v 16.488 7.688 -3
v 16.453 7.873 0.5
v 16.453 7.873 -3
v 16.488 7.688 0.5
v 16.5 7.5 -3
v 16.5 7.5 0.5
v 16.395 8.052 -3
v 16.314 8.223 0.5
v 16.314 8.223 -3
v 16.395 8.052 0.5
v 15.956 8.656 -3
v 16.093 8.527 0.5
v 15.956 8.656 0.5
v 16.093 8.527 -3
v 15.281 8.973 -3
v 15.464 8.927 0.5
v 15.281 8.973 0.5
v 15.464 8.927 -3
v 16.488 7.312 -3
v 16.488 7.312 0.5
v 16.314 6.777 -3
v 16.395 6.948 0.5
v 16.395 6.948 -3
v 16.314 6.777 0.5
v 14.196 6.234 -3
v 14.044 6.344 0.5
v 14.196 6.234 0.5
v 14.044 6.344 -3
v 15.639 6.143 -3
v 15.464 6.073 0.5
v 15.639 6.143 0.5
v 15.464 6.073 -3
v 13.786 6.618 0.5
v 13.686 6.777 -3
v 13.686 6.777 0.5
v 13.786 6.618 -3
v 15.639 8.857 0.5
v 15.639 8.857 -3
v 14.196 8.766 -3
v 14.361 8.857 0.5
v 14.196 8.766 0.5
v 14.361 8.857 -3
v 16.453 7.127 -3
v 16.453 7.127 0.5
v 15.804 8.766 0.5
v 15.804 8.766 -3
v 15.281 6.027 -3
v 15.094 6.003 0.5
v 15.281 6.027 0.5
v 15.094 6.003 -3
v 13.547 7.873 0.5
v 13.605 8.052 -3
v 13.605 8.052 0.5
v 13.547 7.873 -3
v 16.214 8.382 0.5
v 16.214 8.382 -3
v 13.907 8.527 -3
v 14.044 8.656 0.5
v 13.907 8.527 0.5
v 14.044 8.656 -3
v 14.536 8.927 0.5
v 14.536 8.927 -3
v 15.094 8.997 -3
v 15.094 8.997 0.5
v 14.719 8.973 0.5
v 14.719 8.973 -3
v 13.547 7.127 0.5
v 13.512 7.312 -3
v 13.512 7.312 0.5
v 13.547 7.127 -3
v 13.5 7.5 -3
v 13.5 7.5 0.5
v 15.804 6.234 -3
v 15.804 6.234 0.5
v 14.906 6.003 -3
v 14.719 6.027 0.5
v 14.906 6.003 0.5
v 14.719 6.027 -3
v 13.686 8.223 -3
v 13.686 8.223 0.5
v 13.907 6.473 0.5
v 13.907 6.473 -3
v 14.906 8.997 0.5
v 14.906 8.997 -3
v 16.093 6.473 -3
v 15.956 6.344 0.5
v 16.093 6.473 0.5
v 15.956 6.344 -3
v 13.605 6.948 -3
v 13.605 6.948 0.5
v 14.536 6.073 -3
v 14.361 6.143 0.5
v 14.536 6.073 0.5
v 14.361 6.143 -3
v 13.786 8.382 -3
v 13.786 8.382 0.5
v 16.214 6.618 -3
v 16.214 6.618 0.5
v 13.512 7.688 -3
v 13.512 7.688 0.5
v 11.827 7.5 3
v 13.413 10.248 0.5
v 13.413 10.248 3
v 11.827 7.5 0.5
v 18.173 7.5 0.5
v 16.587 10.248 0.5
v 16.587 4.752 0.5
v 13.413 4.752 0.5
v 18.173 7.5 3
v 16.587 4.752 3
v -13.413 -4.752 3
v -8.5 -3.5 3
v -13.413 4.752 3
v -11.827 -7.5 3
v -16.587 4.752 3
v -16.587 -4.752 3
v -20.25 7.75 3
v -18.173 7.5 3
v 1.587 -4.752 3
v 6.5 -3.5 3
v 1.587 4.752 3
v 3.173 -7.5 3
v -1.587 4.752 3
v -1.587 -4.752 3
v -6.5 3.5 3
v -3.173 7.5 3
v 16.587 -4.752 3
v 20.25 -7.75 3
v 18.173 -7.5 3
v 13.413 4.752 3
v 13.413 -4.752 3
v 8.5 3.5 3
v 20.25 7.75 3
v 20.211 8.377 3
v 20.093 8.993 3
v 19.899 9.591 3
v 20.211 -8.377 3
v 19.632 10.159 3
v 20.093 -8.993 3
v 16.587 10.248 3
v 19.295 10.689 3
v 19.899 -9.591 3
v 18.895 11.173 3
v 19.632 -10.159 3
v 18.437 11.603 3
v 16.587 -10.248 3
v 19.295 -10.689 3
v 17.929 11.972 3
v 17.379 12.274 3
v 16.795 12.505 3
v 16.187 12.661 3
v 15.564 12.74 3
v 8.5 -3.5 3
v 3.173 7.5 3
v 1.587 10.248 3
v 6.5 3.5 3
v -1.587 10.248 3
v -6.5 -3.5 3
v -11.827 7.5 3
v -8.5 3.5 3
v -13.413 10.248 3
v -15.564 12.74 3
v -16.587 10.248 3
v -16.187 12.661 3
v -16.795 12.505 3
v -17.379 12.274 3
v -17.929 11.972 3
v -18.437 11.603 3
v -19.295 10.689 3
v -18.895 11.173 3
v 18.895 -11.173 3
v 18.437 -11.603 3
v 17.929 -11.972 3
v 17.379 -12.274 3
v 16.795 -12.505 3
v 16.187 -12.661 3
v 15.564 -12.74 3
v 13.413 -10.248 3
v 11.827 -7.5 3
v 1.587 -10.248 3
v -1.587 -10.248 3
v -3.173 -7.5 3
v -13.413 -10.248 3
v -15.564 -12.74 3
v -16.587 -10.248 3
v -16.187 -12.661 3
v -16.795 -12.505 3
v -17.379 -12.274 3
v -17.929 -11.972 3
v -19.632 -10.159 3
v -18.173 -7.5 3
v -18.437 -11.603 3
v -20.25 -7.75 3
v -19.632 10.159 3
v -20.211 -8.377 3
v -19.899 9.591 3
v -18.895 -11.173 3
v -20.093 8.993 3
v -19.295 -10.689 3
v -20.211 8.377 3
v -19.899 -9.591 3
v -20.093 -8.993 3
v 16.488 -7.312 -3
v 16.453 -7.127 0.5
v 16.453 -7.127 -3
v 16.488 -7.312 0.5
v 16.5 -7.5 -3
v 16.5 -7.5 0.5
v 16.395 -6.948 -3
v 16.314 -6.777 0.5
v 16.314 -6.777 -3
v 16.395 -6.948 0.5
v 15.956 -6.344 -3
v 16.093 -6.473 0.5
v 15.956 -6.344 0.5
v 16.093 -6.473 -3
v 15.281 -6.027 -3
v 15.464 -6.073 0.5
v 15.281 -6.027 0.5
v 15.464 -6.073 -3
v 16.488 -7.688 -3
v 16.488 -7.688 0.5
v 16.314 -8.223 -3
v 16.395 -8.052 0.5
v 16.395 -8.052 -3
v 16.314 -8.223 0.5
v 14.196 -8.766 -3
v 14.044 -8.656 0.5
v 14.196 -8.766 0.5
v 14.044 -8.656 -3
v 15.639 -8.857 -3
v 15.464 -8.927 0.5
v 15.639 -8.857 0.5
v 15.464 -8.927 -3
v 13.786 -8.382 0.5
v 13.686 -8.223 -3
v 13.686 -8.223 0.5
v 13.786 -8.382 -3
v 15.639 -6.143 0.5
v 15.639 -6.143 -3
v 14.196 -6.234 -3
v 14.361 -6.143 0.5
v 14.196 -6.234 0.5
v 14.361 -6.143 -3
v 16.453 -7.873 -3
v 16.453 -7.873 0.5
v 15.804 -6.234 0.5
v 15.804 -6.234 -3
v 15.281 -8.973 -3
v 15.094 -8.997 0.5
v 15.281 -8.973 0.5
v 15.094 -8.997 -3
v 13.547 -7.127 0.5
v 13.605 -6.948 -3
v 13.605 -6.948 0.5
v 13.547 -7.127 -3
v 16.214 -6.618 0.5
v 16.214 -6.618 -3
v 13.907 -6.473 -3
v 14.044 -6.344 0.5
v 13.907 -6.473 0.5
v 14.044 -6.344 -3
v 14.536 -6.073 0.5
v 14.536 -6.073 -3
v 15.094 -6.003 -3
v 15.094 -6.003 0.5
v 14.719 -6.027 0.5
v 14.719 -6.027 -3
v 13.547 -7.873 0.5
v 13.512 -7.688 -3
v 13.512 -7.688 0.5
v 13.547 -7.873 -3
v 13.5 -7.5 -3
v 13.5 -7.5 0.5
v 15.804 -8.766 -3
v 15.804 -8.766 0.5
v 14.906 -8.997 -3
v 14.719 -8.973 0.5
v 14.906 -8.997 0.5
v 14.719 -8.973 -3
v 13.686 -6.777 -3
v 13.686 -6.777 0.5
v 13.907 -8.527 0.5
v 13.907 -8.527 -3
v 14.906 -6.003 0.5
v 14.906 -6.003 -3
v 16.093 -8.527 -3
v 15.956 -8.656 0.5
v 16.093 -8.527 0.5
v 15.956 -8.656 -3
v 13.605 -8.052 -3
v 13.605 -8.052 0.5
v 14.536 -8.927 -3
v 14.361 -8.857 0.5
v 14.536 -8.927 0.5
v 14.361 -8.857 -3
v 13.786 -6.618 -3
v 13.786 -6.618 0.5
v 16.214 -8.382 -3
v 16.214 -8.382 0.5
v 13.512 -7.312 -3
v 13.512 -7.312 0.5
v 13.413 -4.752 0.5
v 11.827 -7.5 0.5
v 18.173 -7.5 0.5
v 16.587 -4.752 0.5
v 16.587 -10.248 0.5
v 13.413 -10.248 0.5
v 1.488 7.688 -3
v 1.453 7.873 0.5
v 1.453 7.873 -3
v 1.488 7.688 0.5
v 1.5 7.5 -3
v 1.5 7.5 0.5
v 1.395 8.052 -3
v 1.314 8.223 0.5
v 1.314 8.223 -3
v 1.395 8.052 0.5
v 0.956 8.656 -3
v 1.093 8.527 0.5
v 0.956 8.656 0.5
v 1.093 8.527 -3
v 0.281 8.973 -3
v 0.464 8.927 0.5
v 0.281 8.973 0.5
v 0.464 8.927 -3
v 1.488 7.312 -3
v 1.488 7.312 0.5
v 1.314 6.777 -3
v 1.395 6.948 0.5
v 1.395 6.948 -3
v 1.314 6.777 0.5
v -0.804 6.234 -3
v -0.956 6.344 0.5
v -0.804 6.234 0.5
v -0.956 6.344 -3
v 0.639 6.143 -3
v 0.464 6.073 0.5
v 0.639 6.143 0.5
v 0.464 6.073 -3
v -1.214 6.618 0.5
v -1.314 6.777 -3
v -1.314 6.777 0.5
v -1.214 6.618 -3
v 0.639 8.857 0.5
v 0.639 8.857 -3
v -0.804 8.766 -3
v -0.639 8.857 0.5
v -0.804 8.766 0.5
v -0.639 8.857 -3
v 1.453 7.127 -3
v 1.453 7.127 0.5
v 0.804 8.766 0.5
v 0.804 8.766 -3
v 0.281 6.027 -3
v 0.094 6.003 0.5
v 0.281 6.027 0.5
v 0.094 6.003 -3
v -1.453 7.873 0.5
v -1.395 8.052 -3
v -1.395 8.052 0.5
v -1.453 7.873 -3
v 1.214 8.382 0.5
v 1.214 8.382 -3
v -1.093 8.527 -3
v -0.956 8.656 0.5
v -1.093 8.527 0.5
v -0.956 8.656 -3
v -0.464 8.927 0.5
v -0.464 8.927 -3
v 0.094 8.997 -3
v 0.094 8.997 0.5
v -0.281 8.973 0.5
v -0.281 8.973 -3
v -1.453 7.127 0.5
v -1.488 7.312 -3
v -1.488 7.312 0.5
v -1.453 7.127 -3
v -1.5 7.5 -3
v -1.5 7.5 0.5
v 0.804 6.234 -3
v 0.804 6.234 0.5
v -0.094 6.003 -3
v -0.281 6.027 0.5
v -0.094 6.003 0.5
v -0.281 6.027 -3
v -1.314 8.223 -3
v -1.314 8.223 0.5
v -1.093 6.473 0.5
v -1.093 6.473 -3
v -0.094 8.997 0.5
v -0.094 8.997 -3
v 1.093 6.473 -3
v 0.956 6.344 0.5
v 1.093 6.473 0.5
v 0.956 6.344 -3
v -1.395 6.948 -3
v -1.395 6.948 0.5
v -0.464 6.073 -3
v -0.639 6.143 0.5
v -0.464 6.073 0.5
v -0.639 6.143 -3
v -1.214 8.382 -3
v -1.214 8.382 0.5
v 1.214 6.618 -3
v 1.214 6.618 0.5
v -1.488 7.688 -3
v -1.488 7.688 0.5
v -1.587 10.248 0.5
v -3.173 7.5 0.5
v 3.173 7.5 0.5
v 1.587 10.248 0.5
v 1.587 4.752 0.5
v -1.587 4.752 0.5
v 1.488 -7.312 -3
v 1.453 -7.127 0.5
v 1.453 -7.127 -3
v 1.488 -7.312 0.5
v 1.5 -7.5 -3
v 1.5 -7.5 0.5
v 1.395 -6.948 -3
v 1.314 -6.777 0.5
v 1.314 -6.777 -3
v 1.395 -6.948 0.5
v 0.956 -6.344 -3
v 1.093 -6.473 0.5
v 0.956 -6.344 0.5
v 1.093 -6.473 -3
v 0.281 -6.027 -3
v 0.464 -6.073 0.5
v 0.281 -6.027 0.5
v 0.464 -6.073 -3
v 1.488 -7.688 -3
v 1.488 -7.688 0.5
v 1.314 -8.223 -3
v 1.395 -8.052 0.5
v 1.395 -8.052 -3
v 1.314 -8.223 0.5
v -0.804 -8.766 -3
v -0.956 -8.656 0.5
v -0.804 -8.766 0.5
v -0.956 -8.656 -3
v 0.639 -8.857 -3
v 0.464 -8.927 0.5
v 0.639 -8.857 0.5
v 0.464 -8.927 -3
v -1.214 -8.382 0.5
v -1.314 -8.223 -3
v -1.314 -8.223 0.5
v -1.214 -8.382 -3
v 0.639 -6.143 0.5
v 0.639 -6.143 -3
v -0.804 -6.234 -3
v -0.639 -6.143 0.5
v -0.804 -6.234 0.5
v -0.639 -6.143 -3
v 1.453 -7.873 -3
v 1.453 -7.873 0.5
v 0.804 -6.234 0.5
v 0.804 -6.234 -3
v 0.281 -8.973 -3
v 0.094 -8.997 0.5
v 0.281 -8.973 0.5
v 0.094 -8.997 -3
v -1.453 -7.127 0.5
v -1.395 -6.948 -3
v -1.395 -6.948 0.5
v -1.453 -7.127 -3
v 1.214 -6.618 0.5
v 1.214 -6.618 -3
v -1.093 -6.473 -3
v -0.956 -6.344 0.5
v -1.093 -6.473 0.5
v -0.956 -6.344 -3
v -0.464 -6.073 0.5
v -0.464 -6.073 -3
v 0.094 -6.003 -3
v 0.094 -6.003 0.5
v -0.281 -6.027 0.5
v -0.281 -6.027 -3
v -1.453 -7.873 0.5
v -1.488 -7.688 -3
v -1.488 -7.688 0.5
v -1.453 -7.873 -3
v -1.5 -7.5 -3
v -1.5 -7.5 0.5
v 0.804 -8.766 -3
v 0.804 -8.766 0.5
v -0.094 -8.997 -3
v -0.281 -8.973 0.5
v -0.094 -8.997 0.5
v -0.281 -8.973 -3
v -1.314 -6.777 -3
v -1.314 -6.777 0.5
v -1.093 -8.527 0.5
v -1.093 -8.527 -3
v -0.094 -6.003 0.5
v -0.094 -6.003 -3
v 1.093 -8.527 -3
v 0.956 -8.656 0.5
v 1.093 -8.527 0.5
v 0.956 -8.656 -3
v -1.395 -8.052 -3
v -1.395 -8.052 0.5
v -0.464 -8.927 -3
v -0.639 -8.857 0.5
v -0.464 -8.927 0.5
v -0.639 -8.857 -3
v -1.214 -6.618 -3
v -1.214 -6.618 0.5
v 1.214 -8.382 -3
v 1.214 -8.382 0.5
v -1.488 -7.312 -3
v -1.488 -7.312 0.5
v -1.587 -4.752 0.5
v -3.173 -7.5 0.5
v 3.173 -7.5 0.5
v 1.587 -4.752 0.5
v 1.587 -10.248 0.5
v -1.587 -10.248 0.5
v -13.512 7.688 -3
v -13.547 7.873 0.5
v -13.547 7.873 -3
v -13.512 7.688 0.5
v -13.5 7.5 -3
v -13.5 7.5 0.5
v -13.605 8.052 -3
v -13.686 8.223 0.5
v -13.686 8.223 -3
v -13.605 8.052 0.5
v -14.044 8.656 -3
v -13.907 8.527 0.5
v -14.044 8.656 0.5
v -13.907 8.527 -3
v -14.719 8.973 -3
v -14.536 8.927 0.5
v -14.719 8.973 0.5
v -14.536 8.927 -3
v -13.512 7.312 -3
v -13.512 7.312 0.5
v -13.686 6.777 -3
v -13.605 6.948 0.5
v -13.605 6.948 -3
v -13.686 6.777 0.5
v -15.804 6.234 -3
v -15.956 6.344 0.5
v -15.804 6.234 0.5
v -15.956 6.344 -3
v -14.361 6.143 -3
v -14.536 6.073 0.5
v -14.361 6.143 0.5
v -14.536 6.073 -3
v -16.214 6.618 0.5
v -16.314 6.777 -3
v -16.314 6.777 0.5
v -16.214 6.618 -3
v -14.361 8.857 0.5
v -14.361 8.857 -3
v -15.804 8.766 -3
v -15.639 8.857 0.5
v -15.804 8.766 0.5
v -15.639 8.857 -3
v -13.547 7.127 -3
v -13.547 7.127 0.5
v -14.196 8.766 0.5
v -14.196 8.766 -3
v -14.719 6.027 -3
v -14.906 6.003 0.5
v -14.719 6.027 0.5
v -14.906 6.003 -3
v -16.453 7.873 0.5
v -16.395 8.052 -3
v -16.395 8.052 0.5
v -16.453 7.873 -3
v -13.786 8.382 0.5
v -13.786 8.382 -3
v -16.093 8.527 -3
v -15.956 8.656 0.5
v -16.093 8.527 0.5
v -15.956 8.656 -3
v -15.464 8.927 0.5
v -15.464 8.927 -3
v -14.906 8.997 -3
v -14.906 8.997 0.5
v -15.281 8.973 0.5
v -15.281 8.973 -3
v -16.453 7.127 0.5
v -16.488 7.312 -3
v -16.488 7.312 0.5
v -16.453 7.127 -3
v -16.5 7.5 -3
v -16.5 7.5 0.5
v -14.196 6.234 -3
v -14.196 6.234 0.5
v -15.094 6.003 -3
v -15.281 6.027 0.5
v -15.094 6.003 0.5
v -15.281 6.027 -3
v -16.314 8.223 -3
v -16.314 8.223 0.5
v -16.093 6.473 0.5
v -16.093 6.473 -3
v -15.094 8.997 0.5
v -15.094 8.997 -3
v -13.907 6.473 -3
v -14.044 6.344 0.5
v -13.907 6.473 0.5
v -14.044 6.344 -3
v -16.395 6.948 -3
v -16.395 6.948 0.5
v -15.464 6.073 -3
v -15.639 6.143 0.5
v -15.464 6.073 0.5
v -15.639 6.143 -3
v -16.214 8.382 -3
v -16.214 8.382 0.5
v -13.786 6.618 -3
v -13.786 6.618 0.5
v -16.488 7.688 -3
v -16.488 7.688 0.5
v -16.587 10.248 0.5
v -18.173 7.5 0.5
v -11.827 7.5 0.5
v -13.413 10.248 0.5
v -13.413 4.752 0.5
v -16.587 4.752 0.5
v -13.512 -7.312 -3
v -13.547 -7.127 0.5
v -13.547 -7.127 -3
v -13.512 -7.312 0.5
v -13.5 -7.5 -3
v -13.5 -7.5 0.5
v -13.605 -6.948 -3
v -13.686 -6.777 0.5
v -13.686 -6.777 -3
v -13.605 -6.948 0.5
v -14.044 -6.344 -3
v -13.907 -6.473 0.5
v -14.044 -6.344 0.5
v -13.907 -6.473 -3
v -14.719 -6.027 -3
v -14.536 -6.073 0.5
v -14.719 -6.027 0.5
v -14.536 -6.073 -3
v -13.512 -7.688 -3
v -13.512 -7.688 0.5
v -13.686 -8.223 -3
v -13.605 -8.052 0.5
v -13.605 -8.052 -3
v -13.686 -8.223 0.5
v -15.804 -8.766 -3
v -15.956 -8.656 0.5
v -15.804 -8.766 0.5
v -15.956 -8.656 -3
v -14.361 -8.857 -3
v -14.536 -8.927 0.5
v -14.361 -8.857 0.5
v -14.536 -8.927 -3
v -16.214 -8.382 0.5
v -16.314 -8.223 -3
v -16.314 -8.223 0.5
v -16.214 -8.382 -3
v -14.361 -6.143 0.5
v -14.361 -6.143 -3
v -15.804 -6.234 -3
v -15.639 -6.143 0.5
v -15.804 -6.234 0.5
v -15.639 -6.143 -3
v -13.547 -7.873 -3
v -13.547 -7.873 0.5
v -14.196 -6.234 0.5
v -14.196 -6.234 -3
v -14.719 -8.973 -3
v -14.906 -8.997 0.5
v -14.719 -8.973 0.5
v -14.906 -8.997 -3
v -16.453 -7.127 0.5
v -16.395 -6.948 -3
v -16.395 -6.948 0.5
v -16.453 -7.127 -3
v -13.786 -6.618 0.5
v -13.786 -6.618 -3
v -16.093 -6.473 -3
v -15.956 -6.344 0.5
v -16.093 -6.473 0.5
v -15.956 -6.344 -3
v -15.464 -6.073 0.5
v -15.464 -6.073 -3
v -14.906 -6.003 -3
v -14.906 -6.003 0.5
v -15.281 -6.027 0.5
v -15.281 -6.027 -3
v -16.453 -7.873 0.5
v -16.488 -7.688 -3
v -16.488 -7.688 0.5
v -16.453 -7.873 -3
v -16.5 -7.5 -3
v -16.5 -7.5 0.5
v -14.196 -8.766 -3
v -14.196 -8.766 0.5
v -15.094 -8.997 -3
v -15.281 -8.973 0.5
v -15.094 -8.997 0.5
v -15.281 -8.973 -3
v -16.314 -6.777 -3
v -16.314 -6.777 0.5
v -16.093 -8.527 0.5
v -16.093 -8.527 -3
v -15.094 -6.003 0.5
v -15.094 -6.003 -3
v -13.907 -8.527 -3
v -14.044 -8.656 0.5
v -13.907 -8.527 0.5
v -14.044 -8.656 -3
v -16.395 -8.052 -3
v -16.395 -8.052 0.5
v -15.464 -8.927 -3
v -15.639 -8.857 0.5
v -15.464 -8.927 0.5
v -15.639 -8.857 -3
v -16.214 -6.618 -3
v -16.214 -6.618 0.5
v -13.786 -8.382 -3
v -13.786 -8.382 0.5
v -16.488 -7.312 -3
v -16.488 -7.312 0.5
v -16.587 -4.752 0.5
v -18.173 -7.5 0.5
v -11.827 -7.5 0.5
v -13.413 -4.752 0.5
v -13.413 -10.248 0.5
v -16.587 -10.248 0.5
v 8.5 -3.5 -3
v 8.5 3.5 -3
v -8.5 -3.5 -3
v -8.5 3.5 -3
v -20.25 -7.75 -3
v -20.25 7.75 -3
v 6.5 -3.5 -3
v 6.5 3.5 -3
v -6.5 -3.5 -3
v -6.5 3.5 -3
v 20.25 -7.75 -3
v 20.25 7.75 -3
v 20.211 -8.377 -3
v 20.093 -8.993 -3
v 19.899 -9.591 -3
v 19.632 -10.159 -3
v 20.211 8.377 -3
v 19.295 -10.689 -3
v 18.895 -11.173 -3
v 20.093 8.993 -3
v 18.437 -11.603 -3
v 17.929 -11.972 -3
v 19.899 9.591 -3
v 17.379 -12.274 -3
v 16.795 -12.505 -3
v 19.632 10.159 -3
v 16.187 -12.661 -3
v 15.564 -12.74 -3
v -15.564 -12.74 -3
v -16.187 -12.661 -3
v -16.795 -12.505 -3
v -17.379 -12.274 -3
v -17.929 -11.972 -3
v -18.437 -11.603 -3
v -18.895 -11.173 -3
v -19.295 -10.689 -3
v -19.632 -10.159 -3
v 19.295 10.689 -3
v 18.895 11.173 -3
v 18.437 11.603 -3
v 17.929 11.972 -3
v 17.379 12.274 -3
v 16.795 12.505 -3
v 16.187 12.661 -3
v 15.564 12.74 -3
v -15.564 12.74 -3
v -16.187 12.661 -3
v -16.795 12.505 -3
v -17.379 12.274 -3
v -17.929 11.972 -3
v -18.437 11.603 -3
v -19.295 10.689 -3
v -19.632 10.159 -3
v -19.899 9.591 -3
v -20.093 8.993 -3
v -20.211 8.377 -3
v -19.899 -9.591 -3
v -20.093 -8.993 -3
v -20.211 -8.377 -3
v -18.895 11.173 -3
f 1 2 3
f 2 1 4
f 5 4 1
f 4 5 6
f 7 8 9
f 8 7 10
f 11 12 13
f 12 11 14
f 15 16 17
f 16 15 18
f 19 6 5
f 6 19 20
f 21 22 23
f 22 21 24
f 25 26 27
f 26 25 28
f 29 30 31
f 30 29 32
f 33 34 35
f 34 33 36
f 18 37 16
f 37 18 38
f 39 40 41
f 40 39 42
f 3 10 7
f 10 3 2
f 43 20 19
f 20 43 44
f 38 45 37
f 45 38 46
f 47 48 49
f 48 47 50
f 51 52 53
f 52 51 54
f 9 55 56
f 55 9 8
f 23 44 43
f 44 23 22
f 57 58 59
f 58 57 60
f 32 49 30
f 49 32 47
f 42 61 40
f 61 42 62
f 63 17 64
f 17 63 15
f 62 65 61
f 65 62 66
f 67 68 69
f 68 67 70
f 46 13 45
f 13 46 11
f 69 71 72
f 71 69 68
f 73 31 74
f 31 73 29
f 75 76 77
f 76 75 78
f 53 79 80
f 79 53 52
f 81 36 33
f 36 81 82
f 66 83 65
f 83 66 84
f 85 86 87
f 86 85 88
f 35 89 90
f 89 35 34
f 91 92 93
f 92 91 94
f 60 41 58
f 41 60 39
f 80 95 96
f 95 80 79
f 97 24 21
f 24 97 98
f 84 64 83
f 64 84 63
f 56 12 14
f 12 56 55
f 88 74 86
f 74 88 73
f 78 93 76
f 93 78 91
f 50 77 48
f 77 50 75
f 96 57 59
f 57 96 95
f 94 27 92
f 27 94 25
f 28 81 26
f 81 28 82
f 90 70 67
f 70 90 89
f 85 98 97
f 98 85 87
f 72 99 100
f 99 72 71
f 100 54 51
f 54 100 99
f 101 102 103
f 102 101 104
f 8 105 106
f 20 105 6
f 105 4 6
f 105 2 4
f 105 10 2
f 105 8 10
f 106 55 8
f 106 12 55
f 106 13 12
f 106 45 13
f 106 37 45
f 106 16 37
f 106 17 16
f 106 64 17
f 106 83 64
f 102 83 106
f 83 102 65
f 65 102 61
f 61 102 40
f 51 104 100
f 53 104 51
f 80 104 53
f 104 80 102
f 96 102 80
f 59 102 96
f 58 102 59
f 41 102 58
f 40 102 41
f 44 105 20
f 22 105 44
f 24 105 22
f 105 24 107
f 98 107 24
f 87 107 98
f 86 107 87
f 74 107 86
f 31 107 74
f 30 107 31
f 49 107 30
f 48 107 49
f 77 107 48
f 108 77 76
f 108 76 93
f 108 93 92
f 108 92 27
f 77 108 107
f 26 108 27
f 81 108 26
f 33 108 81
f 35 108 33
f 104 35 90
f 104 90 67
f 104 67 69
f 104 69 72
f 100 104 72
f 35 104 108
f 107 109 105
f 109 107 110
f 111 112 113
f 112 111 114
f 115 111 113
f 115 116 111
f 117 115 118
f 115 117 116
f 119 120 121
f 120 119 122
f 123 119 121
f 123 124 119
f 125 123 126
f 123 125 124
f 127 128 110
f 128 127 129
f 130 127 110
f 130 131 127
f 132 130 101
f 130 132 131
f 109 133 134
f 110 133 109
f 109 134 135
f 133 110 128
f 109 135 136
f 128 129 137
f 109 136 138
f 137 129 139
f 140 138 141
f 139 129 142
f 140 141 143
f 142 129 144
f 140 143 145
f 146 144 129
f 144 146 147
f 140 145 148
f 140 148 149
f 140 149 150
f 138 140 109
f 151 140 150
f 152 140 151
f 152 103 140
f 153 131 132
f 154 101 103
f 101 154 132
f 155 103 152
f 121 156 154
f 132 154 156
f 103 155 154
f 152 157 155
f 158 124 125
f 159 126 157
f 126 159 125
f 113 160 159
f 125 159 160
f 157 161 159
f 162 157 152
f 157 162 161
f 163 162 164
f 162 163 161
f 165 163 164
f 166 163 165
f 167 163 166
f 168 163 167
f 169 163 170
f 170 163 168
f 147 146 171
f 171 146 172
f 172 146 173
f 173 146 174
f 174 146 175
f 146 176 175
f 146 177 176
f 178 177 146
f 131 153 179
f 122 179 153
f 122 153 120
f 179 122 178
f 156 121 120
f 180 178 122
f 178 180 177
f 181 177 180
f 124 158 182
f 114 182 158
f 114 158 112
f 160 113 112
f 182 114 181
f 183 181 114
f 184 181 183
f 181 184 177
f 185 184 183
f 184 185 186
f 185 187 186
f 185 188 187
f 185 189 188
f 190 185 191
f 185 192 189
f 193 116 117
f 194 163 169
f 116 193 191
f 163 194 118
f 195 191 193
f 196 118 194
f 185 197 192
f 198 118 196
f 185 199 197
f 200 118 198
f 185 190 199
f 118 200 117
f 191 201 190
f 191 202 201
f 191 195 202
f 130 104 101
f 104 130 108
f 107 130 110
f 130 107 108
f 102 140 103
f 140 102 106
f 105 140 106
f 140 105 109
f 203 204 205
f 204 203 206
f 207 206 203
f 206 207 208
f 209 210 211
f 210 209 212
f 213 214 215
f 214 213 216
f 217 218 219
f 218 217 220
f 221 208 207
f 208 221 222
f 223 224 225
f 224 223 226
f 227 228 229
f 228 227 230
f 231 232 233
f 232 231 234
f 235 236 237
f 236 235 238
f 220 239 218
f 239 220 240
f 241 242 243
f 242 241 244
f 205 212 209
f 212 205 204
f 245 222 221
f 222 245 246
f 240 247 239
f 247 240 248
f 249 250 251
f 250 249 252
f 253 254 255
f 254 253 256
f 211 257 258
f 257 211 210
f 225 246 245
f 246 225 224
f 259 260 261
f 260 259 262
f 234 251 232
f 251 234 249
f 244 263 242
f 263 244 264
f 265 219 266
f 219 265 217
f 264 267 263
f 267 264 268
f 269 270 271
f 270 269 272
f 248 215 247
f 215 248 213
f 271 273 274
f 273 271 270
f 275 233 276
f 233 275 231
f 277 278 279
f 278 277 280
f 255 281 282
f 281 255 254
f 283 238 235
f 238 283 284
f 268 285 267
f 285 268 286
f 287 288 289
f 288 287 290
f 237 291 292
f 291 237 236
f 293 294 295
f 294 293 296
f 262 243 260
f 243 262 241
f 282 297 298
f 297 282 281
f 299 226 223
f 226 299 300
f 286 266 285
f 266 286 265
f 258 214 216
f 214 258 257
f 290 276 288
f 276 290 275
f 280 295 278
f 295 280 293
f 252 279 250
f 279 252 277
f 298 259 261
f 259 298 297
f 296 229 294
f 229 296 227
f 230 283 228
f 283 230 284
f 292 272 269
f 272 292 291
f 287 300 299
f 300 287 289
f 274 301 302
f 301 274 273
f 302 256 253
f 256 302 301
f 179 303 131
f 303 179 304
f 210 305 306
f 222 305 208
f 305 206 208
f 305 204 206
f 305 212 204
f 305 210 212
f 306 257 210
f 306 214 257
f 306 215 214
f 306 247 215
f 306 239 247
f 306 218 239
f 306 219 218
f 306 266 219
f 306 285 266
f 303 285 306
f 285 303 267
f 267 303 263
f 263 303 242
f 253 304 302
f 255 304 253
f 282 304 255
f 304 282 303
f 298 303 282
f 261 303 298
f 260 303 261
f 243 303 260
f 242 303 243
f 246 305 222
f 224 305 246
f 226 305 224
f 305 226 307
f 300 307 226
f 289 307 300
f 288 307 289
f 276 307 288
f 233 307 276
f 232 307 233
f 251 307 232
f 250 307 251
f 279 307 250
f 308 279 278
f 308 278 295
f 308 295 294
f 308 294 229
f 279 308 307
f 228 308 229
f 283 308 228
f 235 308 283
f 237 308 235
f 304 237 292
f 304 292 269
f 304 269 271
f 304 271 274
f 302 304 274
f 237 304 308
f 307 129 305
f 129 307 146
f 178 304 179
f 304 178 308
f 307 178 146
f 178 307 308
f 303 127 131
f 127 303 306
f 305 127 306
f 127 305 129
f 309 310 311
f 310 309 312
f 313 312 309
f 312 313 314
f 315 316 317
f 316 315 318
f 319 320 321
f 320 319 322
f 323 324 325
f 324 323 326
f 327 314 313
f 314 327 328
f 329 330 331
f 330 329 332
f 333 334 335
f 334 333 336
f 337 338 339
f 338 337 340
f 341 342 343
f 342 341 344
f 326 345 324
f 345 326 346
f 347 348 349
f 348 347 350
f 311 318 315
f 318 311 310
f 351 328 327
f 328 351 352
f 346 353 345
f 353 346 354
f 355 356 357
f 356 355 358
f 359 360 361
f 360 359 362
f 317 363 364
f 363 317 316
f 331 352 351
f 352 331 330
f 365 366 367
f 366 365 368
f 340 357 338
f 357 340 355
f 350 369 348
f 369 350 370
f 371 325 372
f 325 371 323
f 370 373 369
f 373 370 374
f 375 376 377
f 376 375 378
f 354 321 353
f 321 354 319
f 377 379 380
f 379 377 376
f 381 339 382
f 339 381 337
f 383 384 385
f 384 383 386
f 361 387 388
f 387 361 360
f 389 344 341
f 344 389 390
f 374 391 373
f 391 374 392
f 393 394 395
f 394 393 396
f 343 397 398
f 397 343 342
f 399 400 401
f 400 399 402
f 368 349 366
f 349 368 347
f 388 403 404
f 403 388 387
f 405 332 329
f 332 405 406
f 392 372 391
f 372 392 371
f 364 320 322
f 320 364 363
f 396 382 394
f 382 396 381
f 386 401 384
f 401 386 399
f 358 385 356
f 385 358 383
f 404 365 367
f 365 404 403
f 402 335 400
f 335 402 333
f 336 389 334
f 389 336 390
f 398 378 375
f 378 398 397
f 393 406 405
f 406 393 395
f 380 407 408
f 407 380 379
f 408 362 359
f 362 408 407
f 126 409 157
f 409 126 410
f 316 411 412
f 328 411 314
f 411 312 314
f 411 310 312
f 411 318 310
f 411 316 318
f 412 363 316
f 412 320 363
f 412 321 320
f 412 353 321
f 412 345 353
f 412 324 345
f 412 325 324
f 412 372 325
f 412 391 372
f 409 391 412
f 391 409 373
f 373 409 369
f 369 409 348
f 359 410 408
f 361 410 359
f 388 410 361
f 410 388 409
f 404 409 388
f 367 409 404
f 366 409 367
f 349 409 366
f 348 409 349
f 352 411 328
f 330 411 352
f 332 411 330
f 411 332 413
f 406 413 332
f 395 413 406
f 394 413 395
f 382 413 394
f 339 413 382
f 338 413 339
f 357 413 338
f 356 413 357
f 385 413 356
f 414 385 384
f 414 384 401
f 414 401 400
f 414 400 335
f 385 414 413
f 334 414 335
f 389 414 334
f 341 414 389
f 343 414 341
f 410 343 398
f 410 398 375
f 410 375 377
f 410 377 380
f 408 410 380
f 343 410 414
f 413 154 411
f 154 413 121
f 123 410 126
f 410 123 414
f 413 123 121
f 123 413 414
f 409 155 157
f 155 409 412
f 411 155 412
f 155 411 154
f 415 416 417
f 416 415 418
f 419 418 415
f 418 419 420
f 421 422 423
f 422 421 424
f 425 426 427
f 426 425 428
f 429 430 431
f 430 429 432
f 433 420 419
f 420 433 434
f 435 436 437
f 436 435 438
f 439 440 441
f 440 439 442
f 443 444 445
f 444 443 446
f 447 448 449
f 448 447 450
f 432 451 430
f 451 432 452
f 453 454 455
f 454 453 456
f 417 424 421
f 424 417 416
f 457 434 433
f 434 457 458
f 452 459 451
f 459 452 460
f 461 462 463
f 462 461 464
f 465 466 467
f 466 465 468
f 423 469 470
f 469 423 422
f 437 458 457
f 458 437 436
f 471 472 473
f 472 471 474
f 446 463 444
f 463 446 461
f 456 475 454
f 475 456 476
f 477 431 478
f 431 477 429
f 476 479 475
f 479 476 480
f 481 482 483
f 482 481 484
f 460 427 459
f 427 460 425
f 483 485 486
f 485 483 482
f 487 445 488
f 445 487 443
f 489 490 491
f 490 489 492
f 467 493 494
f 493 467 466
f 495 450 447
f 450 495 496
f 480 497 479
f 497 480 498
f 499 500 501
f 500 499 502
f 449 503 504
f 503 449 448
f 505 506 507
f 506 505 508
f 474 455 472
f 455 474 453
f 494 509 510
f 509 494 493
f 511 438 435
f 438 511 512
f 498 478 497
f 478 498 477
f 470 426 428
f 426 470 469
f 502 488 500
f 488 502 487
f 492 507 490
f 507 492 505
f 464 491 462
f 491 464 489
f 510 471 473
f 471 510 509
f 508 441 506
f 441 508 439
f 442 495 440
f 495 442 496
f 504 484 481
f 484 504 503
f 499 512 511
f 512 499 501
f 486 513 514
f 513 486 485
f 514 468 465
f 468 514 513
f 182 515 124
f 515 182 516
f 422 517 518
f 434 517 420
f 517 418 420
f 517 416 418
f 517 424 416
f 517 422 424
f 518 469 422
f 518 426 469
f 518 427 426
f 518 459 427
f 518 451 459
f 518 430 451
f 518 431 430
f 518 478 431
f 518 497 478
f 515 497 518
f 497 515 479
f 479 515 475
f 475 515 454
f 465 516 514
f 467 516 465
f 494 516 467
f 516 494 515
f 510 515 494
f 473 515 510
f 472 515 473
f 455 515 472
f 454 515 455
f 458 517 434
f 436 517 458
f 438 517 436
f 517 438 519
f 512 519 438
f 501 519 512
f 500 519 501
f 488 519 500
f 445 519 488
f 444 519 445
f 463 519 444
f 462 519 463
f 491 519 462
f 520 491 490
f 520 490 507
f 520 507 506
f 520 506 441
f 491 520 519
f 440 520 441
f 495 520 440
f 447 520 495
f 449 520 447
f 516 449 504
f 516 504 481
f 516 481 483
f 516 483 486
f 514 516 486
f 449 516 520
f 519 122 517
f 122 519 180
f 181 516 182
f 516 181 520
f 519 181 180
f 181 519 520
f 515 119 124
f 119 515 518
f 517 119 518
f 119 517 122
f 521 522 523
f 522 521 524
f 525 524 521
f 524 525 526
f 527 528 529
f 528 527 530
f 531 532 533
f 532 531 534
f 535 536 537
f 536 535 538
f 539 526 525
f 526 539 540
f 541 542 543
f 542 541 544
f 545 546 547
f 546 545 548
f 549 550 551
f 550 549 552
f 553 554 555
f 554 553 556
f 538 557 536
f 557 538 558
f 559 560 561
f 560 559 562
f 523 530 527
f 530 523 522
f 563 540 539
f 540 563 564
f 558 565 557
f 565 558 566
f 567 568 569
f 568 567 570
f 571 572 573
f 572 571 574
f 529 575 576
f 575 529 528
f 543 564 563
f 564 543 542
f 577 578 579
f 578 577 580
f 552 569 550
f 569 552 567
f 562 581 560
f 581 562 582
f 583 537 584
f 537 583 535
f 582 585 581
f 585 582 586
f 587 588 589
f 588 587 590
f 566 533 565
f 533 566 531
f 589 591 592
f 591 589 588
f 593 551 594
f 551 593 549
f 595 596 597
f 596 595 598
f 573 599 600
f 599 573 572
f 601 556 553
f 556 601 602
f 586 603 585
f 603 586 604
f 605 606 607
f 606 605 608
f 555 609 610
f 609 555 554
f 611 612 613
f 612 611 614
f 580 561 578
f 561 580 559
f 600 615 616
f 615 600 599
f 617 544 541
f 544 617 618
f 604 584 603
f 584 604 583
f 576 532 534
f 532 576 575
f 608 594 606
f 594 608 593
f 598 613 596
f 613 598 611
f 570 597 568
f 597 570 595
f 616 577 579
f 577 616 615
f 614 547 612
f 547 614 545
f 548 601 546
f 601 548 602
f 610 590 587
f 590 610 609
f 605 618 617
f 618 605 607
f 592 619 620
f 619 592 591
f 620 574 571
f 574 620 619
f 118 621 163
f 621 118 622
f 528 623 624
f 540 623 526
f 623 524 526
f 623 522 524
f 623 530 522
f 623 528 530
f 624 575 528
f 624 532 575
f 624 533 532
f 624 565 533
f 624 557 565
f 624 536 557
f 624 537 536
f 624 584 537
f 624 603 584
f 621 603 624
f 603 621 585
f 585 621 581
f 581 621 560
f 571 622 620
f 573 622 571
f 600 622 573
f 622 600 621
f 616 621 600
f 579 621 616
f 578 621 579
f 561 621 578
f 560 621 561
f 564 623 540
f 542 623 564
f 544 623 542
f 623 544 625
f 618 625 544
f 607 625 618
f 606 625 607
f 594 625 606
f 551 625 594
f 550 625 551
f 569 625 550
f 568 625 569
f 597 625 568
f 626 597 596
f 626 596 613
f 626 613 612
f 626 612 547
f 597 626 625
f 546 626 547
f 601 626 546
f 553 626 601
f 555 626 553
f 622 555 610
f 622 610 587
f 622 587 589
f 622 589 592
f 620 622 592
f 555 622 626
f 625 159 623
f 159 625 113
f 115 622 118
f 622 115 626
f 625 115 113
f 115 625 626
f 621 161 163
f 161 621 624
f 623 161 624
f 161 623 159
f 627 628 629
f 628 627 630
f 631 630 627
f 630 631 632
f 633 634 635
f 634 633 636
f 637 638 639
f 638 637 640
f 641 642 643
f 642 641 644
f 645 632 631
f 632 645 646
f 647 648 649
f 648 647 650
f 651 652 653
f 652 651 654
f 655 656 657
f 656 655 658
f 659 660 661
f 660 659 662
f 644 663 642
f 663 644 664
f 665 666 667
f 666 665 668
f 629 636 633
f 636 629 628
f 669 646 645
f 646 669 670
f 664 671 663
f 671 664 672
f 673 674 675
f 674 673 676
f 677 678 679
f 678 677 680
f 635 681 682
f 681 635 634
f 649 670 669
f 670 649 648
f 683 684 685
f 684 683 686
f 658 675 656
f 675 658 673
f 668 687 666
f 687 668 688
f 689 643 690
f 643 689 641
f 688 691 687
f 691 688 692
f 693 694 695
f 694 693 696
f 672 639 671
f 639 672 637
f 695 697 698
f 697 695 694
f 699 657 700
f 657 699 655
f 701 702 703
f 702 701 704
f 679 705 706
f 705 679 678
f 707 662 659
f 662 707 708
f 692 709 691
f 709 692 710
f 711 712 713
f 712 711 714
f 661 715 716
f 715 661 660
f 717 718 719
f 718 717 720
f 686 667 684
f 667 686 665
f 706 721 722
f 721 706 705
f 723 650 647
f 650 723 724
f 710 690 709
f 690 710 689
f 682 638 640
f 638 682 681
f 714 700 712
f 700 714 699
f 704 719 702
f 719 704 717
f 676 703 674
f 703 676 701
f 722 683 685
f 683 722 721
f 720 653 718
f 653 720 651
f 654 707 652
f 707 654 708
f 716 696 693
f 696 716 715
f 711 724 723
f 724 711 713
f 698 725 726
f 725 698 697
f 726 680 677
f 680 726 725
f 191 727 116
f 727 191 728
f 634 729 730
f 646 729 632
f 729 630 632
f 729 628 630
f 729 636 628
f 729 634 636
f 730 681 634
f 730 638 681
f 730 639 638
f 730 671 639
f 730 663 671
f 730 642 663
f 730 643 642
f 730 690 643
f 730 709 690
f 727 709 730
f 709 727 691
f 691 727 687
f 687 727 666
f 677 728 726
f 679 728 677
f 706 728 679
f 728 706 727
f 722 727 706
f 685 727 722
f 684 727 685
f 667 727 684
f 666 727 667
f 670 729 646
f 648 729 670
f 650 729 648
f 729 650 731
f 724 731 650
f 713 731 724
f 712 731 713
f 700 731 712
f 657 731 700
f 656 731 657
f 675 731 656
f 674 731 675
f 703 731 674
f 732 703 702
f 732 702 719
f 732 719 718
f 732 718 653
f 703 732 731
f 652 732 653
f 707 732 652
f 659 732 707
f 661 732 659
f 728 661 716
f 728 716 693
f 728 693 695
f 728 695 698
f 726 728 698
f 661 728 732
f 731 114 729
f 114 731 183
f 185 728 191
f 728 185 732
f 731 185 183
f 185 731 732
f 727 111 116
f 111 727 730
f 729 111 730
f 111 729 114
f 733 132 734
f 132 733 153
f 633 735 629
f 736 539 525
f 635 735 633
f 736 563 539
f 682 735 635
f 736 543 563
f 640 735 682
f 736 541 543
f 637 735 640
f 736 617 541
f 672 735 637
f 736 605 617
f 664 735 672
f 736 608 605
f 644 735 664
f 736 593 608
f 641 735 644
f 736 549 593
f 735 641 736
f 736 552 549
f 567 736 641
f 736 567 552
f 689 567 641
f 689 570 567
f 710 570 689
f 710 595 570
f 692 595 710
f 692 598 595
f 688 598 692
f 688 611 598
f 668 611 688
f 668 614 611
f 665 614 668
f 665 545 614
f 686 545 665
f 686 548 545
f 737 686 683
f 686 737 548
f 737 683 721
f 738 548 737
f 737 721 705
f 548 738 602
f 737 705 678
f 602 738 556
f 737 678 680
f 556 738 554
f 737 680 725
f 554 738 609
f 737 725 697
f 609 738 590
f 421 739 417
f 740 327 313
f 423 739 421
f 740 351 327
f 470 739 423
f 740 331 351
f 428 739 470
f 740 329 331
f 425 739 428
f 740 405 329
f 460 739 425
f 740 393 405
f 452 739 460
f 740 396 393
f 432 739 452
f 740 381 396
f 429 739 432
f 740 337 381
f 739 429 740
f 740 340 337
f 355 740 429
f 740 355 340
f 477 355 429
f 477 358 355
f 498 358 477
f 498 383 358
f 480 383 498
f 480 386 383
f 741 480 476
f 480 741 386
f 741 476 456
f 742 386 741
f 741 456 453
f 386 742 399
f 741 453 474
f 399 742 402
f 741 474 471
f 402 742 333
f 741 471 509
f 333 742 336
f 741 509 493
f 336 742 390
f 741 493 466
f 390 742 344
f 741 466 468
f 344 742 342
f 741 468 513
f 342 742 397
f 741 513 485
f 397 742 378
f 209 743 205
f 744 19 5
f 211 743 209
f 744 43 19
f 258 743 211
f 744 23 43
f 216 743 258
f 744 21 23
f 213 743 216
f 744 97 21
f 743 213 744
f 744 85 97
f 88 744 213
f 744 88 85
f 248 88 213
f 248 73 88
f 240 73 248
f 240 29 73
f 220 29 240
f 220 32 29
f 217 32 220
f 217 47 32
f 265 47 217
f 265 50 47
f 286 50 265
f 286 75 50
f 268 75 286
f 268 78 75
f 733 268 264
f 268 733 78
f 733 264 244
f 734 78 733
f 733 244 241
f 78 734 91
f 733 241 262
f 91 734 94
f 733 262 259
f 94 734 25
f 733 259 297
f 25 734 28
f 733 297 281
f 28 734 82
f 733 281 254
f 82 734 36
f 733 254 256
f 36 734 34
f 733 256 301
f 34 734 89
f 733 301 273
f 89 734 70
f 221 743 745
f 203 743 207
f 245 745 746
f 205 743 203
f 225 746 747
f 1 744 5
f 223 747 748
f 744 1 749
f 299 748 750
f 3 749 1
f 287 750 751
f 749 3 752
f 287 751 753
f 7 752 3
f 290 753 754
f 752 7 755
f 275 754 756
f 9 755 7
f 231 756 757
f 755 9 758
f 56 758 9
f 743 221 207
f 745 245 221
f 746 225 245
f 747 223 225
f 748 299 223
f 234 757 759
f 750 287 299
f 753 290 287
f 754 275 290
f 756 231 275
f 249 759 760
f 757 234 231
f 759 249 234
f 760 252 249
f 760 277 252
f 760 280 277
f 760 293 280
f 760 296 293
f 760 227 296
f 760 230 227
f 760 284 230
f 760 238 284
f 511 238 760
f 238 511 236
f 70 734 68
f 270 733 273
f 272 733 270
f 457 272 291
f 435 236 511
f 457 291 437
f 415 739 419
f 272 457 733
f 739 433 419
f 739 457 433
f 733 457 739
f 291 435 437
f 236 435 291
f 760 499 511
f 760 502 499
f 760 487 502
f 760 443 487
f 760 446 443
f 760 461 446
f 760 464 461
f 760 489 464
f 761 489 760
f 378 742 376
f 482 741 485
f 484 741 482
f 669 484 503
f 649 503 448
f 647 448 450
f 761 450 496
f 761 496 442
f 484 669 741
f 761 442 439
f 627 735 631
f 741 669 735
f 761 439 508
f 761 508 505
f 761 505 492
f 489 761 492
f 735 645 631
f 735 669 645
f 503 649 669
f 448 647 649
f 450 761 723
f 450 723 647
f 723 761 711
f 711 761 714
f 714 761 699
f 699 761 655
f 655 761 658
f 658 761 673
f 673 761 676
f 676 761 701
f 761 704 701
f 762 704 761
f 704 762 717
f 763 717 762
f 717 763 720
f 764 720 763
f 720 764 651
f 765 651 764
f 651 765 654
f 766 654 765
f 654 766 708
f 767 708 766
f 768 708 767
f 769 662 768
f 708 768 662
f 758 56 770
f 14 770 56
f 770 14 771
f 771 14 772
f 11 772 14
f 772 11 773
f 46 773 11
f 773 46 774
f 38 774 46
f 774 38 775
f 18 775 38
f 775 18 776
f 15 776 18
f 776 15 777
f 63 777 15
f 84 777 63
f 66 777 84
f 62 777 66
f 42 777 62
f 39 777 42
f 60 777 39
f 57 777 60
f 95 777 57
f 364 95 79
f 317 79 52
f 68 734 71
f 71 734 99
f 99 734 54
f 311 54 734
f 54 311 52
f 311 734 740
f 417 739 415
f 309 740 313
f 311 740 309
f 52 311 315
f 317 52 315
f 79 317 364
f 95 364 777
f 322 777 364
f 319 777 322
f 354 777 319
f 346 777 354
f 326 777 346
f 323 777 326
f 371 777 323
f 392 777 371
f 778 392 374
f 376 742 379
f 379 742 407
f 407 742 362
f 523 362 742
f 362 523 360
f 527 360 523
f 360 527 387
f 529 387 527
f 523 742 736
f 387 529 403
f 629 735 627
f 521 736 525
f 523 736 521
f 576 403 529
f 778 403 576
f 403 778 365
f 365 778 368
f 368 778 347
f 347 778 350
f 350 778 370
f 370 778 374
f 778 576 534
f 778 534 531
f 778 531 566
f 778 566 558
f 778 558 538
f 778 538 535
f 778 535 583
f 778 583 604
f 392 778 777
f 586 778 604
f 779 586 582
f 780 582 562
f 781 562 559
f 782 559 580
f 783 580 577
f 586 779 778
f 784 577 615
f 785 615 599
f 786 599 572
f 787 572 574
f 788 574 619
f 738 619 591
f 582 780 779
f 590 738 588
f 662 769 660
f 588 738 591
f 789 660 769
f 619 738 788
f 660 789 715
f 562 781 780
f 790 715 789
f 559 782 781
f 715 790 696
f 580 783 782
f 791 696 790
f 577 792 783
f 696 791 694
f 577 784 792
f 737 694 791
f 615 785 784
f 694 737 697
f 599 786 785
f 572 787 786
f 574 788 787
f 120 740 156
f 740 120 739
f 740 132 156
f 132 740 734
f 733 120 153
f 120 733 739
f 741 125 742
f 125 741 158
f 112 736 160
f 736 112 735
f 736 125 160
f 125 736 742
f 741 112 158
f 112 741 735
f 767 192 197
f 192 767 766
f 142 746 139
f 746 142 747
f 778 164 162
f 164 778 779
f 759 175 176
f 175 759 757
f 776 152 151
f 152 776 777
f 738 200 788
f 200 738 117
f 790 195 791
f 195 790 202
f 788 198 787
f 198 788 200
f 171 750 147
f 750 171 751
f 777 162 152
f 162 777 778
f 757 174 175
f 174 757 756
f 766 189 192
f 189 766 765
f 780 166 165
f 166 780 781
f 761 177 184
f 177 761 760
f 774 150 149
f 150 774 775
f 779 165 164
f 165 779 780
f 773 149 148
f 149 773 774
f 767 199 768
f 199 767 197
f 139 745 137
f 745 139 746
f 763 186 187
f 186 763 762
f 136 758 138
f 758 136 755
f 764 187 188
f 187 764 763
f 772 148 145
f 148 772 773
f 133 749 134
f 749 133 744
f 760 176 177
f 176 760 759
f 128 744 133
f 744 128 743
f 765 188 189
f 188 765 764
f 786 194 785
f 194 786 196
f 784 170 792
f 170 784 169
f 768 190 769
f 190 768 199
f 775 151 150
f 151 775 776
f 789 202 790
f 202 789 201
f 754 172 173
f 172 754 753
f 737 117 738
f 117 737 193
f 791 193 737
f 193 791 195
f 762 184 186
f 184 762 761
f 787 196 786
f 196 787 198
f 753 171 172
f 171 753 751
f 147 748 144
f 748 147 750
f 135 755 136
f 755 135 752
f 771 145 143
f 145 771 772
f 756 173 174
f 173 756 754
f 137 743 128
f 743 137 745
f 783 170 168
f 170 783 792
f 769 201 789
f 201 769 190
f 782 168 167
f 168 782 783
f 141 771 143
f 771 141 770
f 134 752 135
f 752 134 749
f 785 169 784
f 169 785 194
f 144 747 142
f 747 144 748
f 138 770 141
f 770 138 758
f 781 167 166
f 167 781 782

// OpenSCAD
$fn = 50;


difference() {
	union() {
		translate(v = [0, 0, -3.0000000000]) {
			hull() {
				translate(v = [-15.2500000000, 7.7500000000, 0]) {
					cylinder(h = 6, r = 5);
				}
				translate(v = [15.2500000000, 7.7500000000, 0]) {
					cylinder(h = 6, r = 5);
				}
				translate(v = [-15.2500000000, -7.7500000000, 0]) {
					cylinder(h = 6, r = 5);
				}
				translate(v = [15.2500000000, -7.7500000000, 0]) {
					cylinder(h = 6, r = 5);
				}
			}
		}
	}
	union() {
		translate(v = [15, 7.5000000000, 3.0000000000]) {
			rotate(a = [0, 0, 0]) {
				difference() {
					union() {
						translate(v = [0, 0, -100.0000000000]) {
							cylinder(h = 200, r = 1.5000000000);
						}
						translate(v = [0, 0, -100.0000000000]) {
							cylinder(h = 200, r = 1.5000000000);
						}
						translate(v = [0, 0, -2.5000000000]) {
							linear_extrude(height = 2.5000000000) {
								polygon(points = [[3.1735000000, 0.0000000000], [1.5867500000, 2.7483316189], [-1.5867500000, 2.7483316189], [-3.1735000000, 0.0000000000], [-1.5867500000, -2.7483316189], [1.5867500000, -2.7483316189]]);
							}
						}
						translate(v = [0, 0, -100.0000000000]) {
							cylinder(h = 200, r = 1.5000000000);
						}
					}
					union();
				}
			}
		}
		translate(v = [15, -7.5000000000, 3.0000000000]) {
			rotate(a = [0, 0, 0]) {
				difference() {
					union() {
						translate(v = [0, 0, -100.0000000000]) {
							cylinder(h = 200, r = 1.5000000000);
						}
						translate(v = [0, 0, -100.0000000000]) {
							cylinder(h = 200, r = 1.5000000000);
						}
						translate(v = [0, 0, -2.5000000000]) {
							linear_extrude(height = 2.5000000000) {
								polygon(points = [[3.1735000000, 0.0000000000], [1.5867500000, 2.7483316189], [-1.5867500000, 2.7483316189], [-3.1735000000, 0.0000000000], [-1.5867500000, -2.7483316189], [1.5867500000, -2.7483316189]]);
							}
						}
						translate(v = [0, 0, -100.0000000000]) {
							cylinder(h = 200, r = 1.5000000000);
						}
					}
					union();
				}
			}
		}
		translate(v = [0, 7.5000000000, 3.0000000000]) {
			rotate(a = [0, 0, 0]) {
				difference() {
					union() {
						translate(v = [0, 0, -100.0000000000]) {
							cylinder(h = 200, r = 1.5000000000);
						}
						translate(v = [0, 0, -100.0000000000]) {
							cylinder(h = 200, r = 1.5000000000);
						}
						translate(v = [0, 0, -2.5000000000]) {
							linear_extrude(height = 2.5000000000) {
								polygon(points = [[3.1735000000, 0.0000000000], [1.5867500000, 2.7483316189], [-1.5867500000, 2.7483316189], [-3.1735000000, 0.0000000000], [-1.5867500000, -2.7483316189], [1.5867500000, -2.7483316189]]);
							}
						}
						translate(v = [0, 0, -100.0000000000]) {
							cylinder(h = 200, r = 1.5000000000);
						}
					}
					union();
				}
			}
		}
		translate(v = [0, -7.5000000000, 3.0000000000]) {
			rotate(a = [0, 0, 0]) {
				difference() {
					union() {
						translate(v = [0, 0, -100.0000000000]) {
							cylinder(h = 200, r = 1.5000000000);
						}
						translate(v = [0, 0, -100.0000000000]) {
							cylinder(h = 200, r = 1.5000000000);
						}
						translate(v = [0, 0, -2.5000000000]) {
							linear_extrude(height = 2.5000000000) {
								polygon(points = [[3.1735000000, 0.0000000000], [1.5867500000, 2.7483316189], [-1.5867500000, 2.7483316189], [-3.1735000000, 0.0000000000], [-1.5867500000, -2.7483316189], [1.5867500000, -2.7483316189]]);
							}
						}
						translate(v = [0, 0, -100.0000000000]) {
							cylinder(h = 200, r = 1.5000000000);
						}
					}
					union();
				}
			}
		}
		translate(v = [-15, 7.5000000000, 3.0000000000]) {
			rotate(a = [0, 0, 0]) {
				difference() {
					union() {
						translate(v = [0, 0, -100.0000000000]) {
							cylinder(h = 200, r = 1.5000000000);
						}
						translate(v = [0, 0, -100.0000000000]) {
							cylinder(h = 200, r = 1.5000000000);
						}
						translate(v = [0, 0, -2.5000000000]) {
							linear_extrude(height = 2.5000000000) {
								polygon(points = [[3.1735000000, 0.0000000000], [1.5867500000, 2.7483316189], [-1.5867500000, 2.7483316189], [-3.1735000000, 0.0000000000], [-1.5867500000, -2.7483316189], [1.5867500000, -2.7483316189]]);
							}
						}
						translate(v = [0, 0, -100.0000000000]) {
							cylinder(h = 200, r = 1.5000000000);
						}
					}
					union();
				}
			}
		}
		translate(v = [-15, -7.5000000000, 3.0000000000]) {
			rotate(a = [0, 0, 0]) {
				difference() {
					union() {
						translate(v = [0, 0, -100.0000000000]) {
							cylinder(h = 200, r = 1.5000000000);
						}
						translate(v = [0, 0, -100.0000000000]) {
							cylinder(h = 200, r = 1.5000000000);
						}
						translate(v = [0, 0, -2.5000000000]) {
							linear_extrude(height = 2.5000000000) {
								polygon(points = [[3.1735000000, 0.0000000000], [1.5867500000, 2.7483316189], [-1.5867500000, 2.7483316189], [-3.1735000000, 0.0000000000], [-1.5867500000, -2.7483316189], [1.5867500000, -2.7483316189]]);
							}
						}
						translate(v = [0, 0, -100.0000000000]) {
							cylinder(h = 200, r = 1.5000000000);
						}
					}
					union();
				}
			}
		}
		#translate(v = [6.5000000000, -3.5000000000, -3.0000000000]) {
			cube(size = [2, 7, 6]);
		}
		#translate(v = [-8.5000000000, -3.5000000000, -3.0000000000]) {
			cube(size = [2, 7, 6]);
		}
	}
}
